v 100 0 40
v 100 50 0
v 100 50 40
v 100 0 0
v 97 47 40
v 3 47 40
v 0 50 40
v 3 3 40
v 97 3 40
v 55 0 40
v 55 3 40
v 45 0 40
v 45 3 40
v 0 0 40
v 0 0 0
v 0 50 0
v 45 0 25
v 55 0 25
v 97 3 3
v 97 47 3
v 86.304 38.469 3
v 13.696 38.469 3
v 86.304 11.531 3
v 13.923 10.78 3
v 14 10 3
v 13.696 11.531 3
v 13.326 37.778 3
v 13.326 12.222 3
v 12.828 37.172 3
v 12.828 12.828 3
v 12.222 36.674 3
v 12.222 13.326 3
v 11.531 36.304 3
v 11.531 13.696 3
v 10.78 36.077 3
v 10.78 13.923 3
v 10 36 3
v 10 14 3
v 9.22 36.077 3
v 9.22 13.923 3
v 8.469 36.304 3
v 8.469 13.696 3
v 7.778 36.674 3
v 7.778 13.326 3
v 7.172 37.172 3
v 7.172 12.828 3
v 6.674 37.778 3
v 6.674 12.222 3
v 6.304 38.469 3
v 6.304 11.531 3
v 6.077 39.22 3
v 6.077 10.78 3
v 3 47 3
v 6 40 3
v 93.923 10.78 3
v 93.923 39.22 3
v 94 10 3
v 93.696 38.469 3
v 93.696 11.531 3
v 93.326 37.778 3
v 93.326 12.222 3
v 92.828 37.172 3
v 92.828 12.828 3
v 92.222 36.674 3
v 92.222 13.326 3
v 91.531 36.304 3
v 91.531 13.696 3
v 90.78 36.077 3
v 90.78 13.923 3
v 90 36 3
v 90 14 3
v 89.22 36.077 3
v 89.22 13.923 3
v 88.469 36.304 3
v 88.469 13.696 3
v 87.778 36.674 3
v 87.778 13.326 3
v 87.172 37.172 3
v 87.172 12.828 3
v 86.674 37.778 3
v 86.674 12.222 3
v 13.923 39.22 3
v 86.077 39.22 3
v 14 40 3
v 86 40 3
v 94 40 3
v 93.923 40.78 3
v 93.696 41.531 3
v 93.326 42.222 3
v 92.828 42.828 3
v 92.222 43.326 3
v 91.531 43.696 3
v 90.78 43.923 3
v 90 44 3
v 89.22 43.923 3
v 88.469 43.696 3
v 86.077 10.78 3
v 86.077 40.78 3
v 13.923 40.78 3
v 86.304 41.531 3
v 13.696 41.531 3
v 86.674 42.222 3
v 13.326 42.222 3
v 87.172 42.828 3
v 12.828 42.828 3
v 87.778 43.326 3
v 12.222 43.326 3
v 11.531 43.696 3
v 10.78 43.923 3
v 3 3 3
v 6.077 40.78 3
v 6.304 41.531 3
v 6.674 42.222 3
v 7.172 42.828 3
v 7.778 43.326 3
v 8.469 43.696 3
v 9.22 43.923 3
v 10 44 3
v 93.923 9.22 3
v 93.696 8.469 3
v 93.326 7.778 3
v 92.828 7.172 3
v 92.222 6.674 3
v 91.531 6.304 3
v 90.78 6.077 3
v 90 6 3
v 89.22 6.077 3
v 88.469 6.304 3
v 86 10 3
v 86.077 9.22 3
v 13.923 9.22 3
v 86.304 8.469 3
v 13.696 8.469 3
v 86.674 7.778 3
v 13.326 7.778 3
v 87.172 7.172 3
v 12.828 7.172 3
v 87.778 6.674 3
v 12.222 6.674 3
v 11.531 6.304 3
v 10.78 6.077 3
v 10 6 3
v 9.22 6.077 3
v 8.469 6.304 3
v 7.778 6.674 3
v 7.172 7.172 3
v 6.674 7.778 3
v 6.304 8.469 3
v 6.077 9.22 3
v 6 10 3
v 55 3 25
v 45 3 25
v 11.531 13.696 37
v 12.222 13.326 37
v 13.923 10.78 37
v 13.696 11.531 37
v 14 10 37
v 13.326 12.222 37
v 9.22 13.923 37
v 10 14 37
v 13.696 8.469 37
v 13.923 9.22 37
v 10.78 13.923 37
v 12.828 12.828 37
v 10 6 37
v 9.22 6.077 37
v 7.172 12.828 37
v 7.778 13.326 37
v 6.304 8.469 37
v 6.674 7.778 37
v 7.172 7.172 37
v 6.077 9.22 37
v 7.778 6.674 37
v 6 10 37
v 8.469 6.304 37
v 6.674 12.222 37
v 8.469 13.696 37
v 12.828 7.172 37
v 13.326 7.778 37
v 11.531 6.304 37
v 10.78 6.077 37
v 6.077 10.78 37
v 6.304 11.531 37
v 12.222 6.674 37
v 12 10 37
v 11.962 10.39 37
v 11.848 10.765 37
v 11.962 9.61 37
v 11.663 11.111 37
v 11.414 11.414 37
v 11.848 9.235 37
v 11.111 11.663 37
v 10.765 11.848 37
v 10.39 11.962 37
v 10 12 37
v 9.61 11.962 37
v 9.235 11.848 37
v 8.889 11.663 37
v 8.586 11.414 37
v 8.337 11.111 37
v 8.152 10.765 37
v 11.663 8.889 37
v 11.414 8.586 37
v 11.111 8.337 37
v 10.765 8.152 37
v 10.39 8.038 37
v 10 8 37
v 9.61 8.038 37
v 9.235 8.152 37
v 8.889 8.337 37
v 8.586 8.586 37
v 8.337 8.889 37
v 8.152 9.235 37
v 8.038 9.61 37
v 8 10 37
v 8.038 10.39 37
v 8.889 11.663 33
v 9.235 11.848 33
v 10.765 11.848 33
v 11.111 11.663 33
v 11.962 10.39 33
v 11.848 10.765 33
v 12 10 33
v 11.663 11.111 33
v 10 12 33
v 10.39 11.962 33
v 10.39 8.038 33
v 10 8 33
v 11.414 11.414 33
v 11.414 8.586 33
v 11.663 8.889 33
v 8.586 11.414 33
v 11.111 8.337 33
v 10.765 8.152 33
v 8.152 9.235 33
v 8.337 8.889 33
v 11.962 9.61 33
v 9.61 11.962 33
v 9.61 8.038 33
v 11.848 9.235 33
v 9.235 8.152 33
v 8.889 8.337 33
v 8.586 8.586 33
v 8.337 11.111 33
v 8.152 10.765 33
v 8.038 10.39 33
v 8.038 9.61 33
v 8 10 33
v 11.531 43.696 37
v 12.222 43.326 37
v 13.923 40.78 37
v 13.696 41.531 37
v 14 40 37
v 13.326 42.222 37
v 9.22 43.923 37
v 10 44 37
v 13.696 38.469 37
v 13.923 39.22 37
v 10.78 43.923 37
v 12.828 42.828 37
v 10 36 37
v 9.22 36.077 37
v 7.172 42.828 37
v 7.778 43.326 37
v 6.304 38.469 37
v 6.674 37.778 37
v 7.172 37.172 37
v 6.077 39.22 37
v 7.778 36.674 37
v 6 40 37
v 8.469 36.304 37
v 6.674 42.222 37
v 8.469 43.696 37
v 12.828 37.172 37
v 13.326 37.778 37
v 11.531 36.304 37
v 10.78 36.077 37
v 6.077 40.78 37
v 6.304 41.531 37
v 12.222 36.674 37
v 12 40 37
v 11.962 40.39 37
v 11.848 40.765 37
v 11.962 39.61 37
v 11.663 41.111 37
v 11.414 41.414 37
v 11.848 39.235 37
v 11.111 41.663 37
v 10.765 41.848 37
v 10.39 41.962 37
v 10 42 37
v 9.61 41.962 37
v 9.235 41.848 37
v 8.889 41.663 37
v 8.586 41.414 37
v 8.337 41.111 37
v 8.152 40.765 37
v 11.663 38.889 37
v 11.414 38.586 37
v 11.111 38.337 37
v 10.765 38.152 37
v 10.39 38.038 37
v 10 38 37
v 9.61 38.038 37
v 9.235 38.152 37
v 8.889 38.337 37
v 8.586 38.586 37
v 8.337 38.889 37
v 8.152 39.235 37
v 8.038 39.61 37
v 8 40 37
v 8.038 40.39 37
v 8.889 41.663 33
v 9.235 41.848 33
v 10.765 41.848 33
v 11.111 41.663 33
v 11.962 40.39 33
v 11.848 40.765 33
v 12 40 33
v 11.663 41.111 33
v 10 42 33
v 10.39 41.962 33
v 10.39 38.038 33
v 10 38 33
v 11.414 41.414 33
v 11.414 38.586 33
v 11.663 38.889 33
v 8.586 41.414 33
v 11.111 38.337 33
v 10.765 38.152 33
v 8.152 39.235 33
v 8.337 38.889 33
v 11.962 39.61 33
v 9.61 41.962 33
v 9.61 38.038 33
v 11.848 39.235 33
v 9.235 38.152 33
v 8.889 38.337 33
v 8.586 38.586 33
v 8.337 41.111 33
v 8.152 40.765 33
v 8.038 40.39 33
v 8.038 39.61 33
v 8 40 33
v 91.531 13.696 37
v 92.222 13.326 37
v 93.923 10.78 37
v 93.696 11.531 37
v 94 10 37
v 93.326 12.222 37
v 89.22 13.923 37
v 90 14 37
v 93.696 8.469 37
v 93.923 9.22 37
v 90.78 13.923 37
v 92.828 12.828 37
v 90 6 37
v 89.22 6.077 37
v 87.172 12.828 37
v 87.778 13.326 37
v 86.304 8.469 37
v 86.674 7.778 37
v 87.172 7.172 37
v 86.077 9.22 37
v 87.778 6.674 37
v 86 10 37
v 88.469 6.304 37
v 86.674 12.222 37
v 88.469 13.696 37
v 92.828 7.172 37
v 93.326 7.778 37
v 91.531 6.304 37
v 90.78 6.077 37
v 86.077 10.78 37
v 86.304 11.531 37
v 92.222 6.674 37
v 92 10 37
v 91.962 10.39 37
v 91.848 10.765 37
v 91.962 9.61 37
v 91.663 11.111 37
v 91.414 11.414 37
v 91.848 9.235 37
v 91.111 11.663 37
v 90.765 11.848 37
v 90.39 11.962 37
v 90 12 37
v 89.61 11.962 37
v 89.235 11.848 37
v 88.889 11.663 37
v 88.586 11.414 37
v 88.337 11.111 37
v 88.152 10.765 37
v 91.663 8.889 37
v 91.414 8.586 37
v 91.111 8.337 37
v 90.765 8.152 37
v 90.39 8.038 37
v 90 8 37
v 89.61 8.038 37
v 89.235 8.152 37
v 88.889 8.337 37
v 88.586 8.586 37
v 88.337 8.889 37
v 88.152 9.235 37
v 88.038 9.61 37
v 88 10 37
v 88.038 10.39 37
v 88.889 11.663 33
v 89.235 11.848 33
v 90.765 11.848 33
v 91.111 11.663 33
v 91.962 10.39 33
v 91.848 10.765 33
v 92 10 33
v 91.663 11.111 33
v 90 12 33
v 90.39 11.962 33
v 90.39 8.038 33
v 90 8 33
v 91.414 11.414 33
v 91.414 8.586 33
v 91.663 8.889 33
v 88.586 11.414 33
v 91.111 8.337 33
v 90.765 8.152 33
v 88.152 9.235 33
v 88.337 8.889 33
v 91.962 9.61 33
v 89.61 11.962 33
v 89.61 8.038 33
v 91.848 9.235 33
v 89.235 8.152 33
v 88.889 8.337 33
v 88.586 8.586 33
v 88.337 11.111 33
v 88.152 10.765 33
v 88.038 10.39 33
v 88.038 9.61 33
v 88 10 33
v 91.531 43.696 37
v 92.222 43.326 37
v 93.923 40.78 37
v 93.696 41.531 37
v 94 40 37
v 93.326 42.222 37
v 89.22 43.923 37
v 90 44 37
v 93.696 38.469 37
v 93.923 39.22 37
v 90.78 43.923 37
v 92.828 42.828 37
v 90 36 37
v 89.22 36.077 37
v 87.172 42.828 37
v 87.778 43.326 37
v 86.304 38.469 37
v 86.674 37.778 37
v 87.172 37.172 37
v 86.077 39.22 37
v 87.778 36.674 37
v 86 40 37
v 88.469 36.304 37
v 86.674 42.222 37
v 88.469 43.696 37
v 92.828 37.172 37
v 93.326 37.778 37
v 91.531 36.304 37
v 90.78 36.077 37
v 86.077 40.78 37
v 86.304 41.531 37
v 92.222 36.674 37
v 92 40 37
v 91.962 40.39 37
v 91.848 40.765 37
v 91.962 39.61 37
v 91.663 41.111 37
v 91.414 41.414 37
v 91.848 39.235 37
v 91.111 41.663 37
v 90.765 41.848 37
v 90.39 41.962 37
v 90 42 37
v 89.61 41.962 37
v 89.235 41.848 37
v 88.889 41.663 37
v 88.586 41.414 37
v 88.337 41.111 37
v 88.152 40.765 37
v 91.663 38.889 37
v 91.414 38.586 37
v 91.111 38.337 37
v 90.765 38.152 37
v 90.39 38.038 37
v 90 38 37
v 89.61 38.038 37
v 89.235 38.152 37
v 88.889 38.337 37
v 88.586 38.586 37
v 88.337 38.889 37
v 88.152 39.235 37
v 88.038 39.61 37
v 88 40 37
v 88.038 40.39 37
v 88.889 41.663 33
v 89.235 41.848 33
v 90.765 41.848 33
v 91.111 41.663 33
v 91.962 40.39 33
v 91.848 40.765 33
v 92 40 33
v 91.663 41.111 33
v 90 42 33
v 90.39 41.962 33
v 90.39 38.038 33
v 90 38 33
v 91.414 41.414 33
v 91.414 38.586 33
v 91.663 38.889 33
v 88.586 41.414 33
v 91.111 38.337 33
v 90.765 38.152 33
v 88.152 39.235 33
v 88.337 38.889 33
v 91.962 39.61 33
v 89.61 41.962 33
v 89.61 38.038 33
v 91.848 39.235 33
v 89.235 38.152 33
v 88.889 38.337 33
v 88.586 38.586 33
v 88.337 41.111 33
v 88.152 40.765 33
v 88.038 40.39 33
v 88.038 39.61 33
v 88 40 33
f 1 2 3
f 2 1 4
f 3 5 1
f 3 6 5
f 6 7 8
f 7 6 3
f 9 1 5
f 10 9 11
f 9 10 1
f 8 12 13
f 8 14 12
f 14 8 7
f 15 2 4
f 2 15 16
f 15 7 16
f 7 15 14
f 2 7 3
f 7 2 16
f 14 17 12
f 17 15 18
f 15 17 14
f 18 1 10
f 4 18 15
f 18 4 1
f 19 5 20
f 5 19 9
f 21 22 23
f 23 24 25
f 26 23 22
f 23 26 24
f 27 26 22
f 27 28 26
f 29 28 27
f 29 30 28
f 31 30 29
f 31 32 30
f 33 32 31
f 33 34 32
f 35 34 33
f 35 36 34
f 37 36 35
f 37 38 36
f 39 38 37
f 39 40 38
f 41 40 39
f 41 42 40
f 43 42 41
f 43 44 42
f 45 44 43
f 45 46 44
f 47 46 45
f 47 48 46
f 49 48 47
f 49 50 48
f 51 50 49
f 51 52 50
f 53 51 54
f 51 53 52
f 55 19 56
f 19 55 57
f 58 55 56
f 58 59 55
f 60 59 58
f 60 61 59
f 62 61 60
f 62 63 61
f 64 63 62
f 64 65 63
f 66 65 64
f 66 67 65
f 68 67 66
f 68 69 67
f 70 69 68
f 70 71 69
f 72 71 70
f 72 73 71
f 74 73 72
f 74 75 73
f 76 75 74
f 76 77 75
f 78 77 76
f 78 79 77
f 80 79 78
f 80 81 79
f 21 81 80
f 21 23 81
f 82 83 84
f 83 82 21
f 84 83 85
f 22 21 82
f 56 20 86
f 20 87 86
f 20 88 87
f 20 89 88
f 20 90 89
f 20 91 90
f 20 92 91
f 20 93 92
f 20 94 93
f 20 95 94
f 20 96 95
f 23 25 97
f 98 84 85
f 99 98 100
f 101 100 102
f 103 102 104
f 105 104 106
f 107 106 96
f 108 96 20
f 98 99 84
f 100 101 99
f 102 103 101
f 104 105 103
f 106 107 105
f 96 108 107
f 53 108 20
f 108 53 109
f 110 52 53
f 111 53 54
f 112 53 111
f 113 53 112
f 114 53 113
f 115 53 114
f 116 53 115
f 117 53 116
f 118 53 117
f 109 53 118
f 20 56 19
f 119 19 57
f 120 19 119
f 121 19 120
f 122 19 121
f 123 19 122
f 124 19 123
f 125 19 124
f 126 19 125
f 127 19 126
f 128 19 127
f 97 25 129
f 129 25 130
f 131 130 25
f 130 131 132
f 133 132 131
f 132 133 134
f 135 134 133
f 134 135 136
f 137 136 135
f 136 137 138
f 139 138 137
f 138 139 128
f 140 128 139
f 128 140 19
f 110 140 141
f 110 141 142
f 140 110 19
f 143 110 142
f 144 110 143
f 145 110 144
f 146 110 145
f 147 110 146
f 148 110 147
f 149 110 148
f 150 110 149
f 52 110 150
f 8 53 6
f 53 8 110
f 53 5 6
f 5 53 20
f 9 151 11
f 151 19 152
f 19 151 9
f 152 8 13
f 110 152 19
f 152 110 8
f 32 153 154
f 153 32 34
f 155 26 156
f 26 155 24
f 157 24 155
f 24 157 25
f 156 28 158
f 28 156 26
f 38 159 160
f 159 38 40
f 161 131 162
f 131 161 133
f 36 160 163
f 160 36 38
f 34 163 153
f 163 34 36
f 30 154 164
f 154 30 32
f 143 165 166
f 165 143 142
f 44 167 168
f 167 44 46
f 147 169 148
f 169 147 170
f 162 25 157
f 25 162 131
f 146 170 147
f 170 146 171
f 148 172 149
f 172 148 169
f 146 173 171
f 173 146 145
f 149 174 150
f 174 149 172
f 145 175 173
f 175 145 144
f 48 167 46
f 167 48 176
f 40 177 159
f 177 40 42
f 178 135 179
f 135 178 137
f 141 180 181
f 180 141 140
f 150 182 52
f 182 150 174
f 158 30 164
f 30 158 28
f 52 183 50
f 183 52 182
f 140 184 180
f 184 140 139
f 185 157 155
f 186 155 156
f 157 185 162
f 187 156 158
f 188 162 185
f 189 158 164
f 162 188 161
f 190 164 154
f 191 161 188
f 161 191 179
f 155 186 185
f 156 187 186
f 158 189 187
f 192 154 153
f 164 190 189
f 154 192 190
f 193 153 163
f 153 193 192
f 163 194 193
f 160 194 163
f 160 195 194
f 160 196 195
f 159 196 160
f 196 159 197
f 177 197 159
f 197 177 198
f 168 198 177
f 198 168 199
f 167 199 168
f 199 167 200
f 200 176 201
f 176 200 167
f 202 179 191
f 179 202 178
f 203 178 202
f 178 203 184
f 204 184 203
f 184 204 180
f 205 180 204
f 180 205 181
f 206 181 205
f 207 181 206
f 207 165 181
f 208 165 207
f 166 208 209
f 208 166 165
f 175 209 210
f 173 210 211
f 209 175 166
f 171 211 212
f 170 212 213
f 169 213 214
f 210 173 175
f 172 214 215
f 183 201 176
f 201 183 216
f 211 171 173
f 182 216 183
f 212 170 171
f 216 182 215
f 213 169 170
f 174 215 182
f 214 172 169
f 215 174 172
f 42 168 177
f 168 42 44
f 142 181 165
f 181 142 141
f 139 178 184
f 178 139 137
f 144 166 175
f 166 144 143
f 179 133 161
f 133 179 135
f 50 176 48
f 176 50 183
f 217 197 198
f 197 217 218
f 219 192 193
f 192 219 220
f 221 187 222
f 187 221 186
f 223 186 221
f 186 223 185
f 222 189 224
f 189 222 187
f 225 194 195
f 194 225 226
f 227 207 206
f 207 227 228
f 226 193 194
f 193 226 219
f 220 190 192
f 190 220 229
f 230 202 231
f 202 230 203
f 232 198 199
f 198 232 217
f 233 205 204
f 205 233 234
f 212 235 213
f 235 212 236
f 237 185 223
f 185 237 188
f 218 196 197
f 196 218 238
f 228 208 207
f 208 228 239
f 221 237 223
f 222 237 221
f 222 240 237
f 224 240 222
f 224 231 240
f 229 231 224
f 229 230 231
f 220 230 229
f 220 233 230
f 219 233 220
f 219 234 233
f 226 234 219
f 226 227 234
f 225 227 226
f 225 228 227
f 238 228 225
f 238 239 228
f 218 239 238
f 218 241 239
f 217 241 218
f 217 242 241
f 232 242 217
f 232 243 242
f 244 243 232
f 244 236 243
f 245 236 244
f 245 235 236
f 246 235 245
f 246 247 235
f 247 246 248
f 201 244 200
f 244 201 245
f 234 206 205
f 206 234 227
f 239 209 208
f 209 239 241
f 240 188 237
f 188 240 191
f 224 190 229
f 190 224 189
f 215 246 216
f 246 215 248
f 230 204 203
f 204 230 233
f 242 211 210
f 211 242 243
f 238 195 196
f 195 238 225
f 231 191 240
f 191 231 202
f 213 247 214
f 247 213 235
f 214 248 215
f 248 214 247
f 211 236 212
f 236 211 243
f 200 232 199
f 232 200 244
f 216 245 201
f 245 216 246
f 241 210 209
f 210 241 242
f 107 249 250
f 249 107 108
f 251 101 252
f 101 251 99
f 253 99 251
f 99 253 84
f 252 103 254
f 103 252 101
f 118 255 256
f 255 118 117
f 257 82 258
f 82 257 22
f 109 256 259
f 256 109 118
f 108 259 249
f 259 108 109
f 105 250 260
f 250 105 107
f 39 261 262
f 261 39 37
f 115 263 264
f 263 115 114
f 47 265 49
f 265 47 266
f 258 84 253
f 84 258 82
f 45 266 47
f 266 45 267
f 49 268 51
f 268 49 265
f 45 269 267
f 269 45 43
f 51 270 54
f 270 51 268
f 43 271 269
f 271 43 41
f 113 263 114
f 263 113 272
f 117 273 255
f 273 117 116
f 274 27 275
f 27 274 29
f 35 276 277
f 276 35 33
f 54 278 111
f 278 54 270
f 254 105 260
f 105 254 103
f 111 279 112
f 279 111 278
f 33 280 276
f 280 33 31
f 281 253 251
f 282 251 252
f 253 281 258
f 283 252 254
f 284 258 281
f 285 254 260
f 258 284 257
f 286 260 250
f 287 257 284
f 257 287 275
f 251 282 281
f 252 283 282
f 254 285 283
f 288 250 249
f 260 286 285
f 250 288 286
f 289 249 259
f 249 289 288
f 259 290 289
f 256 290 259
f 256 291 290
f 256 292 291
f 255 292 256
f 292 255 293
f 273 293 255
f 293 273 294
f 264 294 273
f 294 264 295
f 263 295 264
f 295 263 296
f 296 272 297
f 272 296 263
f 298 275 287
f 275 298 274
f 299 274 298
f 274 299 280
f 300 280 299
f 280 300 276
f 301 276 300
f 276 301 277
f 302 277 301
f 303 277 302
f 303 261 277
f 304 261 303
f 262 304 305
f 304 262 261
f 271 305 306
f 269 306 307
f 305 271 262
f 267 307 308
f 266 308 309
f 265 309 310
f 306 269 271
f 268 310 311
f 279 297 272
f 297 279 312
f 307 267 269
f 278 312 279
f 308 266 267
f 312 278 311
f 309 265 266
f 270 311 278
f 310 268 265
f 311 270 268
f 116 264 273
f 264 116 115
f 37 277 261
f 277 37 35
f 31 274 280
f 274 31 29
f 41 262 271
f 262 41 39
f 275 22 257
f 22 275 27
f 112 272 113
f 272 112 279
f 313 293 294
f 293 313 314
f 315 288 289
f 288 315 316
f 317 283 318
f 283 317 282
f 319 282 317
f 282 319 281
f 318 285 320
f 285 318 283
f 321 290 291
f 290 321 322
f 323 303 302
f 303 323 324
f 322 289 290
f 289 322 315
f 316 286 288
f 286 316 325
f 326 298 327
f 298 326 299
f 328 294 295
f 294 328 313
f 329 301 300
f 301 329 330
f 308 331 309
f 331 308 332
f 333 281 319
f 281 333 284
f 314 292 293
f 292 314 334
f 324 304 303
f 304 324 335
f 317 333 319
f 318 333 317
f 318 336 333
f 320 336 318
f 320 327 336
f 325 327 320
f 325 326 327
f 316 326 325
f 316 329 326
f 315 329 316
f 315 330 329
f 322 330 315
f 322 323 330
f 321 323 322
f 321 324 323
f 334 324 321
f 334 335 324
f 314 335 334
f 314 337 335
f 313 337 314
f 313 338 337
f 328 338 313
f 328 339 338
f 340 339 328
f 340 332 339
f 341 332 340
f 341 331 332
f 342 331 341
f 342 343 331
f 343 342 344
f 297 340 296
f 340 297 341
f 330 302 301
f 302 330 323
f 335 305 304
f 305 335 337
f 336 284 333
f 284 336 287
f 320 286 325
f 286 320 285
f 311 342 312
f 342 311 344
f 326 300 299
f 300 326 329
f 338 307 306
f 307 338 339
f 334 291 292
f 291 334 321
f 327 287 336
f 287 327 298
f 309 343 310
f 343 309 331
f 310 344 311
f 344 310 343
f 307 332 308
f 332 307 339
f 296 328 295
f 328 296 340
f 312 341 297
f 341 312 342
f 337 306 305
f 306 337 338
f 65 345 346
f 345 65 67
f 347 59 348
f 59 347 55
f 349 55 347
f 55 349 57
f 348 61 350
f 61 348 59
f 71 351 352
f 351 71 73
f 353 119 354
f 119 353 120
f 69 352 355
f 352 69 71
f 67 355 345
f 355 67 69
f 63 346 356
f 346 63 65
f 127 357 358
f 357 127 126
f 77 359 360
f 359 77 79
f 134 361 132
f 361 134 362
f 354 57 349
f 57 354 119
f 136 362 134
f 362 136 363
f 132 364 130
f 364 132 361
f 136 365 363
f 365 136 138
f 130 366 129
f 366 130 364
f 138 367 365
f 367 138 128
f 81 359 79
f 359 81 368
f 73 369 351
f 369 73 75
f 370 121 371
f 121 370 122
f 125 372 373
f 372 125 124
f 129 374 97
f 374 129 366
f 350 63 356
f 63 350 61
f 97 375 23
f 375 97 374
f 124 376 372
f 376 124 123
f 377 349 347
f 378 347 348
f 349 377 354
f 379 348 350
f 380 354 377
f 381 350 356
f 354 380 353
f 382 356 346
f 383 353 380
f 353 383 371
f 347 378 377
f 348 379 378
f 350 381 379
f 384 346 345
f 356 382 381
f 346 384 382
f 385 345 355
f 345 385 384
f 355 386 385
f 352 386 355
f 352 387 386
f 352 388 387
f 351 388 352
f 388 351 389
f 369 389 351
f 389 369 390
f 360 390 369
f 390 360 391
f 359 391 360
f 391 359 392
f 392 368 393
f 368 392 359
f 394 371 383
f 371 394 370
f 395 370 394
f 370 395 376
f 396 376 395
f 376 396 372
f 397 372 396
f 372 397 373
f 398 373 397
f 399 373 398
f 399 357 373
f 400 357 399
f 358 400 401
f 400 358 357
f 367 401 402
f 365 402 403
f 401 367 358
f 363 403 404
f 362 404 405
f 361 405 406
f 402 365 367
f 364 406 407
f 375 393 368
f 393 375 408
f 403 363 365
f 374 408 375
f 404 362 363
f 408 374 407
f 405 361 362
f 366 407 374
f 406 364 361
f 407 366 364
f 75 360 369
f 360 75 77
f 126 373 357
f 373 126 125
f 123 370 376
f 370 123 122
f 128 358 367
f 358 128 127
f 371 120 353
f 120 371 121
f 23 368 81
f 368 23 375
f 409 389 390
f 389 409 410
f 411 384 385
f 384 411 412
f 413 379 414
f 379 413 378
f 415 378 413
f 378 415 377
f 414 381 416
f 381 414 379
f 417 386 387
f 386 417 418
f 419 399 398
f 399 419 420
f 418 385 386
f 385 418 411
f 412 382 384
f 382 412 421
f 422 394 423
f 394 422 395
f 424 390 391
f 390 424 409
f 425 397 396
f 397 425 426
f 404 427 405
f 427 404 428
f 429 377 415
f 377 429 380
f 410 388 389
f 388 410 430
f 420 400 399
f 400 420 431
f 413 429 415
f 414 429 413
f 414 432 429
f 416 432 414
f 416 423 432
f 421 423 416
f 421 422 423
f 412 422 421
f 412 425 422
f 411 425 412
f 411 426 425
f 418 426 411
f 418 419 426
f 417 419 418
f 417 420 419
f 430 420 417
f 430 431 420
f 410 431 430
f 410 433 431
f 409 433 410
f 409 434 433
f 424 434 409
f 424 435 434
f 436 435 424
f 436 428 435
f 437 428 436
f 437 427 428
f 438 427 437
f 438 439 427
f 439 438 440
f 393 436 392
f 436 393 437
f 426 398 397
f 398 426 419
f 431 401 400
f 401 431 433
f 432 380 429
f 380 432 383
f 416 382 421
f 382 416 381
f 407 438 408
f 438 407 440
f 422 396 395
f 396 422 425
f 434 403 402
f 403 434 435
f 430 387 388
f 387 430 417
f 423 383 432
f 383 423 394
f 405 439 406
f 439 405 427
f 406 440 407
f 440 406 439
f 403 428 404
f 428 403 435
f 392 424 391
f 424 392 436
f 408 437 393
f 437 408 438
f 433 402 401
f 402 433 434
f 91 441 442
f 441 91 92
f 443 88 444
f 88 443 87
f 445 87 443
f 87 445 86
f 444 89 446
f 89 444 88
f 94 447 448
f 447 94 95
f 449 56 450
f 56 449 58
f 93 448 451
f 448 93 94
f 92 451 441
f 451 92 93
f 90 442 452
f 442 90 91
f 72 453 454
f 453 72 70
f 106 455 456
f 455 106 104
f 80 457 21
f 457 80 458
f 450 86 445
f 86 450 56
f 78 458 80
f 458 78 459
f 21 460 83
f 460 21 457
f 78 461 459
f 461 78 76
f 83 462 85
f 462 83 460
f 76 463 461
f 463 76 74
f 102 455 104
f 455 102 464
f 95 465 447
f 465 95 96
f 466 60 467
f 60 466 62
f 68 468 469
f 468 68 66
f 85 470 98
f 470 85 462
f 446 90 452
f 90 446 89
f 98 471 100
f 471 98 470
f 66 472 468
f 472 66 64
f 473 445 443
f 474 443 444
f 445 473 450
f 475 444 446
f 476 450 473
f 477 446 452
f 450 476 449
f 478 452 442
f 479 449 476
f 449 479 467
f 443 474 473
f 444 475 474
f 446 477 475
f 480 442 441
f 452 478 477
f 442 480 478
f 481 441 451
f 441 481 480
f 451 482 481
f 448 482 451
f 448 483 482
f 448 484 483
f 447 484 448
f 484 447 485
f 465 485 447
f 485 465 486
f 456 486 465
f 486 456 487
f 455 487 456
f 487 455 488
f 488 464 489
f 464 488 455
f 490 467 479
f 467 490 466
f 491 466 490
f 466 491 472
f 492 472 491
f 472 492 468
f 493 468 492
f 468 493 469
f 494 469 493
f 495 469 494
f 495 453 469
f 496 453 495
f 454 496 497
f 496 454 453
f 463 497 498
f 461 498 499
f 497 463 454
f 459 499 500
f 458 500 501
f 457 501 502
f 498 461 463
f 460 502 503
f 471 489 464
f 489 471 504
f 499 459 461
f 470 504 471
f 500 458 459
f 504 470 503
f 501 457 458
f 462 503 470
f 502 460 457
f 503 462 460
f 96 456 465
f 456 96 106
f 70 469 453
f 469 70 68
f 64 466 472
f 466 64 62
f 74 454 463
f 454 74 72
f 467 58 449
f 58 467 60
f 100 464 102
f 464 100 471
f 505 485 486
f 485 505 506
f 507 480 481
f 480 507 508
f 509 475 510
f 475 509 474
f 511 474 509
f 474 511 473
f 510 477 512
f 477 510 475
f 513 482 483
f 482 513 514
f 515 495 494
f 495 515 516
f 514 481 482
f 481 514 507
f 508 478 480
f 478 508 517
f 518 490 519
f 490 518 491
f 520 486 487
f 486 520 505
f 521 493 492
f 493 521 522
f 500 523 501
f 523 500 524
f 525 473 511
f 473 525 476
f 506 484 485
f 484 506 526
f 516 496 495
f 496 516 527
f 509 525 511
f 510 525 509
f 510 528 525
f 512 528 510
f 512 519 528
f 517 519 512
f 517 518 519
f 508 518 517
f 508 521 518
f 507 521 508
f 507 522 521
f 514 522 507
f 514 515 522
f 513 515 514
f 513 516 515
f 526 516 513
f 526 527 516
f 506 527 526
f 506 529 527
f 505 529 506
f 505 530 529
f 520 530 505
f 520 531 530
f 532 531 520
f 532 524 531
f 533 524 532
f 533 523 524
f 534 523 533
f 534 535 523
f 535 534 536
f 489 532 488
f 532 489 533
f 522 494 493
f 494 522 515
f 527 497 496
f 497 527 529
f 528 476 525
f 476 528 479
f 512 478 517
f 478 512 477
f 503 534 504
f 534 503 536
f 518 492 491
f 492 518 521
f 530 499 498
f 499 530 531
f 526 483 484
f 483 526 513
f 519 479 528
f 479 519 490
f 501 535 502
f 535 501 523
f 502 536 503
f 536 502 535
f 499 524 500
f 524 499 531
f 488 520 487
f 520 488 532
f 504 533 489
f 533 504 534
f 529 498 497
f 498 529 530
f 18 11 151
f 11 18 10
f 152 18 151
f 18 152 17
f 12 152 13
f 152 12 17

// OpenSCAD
$fn = 32;

// ----------------------------------------------------------------------
// Enclosure box: both enclosure
// ----------------------------------------------------------------------

// --- parameters (mm) ---
box_l = 100;              // outer length, X
box_w = 50;               // outer width, Y
box_h = 40;               // outer height
wall_t = 3;               // wall thickness
boss_r = 4;               // corner boss radius
hole_r = 2;               // boss screw hole radius
boss_in = 10;             // boss inset from the corners
notch_w = 10;             // cable notch width
notch_h = 15;             // cable notch height

inner_h = box_h - wall_t;  // cavity depth
boss_h = inner_h - 2;  // corner boss height

difference() {
  union() {
    difference() {
      cube([box_l, box_w, box_h]);
      translate([wall_t, wall_t, wall_t])
        cube([box_l - 2 * wall_t, box_w - 2 * wall_t, box_h]);
    }
    for (sx = [0, 1], sy = [0, 1])
      translate([sx ? box_l - boss_in : boss_in,
                 sy ? box_w - boss_in : boss_in, wall_t - 1])
        difference() {
          cylinder(r = boss_r, h = boss_h);
          translate([0, 0, boss_h - 4])
            cylinder(r = hole_r, h = 5);
        }
  }
  translate([box_l / 2 - notch_w / 2, -1, box_h - notch_h])
    cube([notch_w, wall_t + 2, notch_h + 1]);
}
